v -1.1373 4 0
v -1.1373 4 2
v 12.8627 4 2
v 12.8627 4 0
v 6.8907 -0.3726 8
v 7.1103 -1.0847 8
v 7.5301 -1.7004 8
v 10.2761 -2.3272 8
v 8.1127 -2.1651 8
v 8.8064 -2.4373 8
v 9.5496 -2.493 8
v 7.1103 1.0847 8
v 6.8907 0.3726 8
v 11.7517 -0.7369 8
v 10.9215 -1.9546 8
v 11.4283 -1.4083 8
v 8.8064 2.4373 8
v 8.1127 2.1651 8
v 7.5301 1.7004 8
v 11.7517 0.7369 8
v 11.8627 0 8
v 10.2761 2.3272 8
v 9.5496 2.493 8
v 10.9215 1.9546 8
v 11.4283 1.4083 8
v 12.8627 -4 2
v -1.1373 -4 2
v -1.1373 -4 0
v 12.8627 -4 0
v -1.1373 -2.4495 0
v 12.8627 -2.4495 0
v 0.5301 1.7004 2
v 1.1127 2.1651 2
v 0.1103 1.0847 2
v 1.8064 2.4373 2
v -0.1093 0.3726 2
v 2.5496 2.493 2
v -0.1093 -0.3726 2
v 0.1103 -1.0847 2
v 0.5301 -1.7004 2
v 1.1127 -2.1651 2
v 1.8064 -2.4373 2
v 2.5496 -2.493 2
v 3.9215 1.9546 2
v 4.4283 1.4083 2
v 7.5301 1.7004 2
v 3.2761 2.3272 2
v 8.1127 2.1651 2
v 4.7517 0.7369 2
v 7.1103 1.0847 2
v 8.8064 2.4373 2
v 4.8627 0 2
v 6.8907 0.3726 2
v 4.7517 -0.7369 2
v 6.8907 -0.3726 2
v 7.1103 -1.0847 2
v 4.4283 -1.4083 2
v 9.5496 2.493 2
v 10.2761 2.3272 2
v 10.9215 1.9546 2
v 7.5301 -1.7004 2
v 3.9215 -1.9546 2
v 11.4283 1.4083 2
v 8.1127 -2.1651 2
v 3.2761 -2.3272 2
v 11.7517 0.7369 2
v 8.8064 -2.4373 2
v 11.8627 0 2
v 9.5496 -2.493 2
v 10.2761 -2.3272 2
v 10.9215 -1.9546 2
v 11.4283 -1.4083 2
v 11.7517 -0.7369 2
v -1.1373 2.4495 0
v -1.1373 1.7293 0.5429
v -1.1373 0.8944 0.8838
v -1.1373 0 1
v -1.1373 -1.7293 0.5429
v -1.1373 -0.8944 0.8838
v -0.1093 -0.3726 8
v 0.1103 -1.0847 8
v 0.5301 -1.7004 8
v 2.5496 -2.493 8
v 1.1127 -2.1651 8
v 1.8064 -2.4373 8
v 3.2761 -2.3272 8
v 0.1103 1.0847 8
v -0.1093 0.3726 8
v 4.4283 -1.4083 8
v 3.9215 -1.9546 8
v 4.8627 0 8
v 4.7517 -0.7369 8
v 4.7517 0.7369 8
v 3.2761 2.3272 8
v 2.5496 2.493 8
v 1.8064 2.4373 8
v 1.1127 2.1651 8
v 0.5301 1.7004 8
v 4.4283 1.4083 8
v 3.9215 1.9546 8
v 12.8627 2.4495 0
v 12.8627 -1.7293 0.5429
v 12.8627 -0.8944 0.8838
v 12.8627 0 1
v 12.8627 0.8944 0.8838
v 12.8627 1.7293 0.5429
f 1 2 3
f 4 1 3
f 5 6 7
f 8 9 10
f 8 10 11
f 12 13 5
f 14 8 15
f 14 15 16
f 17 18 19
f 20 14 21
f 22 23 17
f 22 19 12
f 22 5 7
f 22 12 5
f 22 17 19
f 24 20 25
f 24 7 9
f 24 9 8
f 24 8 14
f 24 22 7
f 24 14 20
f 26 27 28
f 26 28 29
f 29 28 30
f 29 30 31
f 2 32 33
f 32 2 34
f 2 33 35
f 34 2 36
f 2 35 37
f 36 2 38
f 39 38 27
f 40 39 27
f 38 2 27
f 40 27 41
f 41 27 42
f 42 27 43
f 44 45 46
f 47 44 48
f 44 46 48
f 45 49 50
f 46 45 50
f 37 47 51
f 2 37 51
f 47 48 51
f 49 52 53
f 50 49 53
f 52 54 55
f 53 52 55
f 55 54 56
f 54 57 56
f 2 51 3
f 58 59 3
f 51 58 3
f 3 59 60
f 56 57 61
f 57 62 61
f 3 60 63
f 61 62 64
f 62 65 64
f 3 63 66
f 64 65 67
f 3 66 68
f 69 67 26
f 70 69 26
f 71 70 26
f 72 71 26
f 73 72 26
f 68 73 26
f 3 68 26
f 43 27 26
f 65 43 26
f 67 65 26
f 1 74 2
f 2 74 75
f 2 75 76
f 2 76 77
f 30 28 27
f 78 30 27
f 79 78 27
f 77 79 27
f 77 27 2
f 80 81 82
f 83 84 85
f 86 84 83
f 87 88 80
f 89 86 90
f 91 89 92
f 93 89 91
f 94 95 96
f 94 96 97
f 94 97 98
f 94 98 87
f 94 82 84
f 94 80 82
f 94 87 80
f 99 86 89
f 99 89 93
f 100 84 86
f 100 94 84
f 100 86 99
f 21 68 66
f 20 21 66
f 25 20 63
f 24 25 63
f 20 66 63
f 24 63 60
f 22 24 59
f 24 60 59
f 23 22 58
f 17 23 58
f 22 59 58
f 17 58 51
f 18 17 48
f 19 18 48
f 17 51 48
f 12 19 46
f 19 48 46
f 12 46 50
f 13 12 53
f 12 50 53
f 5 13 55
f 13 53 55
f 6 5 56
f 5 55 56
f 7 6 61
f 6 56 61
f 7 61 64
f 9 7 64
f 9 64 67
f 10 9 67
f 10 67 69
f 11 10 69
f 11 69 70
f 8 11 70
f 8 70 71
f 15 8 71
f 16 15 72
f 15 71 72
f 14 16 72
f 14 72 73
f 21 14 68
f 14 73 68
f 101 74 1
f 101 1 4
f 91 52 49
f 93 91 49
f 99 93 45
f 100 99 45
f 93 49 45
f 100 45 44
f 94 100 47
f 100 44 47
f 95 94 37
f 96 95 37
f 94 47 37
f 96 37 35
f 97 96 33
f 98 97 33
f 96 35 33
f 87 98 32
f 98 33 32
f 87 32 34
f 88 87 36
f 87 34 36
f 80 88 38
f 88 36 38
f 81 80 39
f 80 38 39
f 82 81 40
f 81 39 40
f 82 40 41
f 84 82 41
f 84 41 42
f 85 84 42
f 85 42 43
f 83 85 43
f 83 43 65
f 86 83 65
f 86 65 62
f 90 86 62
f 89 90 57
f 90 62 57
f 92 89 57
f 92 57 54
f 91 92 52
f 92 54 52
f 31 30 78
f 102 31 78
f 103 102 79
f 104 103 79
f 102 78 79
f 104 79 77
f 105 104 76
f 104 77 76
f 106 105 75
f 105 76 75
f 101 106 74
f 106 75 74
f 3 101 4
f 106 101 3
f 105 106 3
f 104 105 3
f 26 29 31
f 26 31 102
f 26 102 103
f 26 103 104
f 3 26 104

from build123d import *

# Parameters (mm, degrees)
F0_W     = 14
F0_H     = 2
F1_DEPTH = 4
F2_R     = 2.5
F3_DEPTH = 6
F5_R     = 3.5
F6_DEPTH = 12.7


with BuildPart() as f1:
    # F0 (on Front) → F1 (new body, symmetric)
    with BuildSketch(Plane.XZ):
        with Locations((5.8627421725, 1)):
            Rectangle(F0_W, F0_H)
    extrude(amount=F1_DEPTH, both=True)

    # F2 (on face) → F3 (join)
    with BuildSketch(Plane.XY.offset(2)):
        with Locations((9.3627421725, 0)):
            Circle(F2_R)
        with Locations((2.3627421725, 0)):
            Circle(F2_R)
    extrude(amount=F3_DEPTH)

    # F5 (on mid) → F6 (cut, symmetric)
    with BuildSketch(Plane(origin=(5.8627421725, 0, 0), x_dir=(0, -1, 0), z_dir=(-1, 0, 0))):
        with Locations((0, -2.5)):
            Circle(F5_R)
    extrude(amount=F6_DEPTH, both=True, mode=Mode.SUBTRACT)


solid = f1.part
